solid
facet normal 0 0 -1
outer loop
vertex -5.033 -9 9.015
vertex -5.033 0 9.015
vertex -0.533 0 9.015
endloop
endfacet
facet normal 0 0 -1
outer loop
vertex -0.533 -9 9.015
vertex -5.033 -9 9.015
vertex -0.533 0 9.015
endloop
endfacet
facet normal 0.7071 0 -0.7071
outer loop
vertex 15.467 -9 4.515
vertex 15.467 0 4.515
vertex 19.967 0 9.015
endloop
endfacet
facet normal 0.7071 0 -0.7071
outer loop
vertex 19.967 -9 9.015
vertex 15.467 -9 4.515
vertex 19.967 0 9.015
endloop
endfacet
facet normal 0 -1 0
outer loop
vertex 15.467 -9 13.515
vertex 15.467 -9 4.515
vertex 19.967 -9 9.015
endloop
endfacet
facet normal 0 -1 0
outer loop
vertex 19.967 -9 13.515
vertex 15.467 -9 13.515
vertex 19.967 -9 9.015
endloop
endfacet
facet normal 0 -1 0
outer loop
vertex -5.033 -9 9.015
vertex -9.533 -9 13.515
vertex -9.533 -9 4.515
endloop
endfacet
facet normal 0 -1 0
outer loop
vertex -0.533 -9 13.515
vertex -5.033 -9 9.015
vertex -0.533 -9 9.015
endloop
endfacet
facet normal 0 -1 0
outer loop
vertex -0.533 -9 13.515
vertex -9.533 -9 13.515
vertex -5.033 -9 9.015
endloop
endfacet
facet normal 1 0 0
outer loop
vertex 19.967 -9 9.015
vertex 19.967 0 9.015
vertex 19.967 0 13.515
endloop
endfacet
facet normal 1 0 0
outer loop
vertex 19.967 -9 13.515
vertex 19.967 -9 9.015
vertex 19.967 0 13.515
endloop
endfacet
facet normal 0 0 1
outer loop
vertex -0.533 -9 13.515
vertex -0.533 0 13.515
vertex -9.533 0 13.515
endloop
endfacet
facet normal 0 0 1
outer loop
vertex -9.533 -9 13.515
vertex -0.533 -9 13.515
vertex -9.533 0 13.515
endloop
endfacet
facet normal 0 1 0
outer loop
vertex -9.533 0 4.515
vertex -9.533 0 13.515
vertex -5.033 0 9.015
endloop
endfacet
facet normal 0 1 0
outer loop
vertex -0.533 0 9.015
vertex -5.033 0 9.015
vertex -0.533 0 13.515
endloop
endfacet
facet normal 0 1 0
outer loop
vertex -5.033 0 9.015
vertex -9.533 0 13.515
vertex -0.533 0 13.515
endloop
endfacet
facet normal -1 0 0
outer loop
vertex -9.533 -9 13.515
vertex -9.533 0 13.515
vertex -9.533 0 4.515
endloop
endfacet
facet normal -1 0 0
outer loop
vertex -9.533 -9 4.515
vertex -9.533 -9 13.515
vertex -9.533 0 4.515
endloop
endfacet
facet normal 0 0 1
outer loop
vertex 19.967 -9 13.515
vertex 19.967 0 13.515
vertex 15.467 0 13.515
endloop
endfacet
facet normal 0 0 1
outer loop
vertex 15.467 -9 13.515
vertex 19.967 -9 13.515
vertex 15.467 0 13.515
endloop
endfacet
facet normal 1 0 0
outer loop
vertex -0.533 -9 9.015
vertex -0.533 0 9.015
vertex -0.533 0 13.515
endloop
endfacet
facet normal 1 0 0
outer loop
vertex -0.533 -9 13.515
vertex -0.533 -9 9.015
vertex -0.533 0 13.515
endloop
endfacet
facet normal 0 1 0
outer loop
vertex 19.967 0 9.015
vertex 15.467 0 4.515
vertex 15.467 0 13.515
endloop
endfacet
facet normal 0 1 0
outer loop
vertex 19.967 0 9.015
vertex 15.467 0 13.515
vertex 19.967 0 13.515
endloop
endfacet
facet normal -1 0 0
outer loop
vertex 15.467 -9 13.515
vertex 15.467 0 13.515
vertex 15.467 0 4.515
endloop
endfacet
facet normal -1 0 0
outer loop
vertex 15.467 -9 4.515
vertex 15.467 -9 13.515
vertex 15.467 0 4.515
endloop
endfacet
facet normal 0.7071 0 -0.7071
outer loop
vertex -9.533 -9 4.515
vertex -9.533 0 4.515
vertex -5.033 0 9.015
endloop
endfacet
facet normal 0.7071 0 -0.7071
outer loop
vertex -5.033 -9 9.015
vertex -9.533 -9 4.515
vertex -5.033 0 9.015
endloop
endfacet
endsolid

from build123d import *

# Parameters (mm, degrees)
F1_DEPTH = 9


with BuildPart() as f1:
    # F0 (on Front) → F1 (new body)
    with BuildSketch(Plane.XZ):
        Polygon((-0.532896, 9.014923), (-0.532896, 13.514923), (-9.532896, 13.514923), (-9.532896, 4.514923), (-5.032896, 9.014923), align=None)
        Polygon((19.967104, 13.514923), (15.467104, 13.514923), (15.467104, 4.514923), (19.967104, 9.014923), align=None)
    extrude(amount=F1_DEPTH)


solid = f1.part
